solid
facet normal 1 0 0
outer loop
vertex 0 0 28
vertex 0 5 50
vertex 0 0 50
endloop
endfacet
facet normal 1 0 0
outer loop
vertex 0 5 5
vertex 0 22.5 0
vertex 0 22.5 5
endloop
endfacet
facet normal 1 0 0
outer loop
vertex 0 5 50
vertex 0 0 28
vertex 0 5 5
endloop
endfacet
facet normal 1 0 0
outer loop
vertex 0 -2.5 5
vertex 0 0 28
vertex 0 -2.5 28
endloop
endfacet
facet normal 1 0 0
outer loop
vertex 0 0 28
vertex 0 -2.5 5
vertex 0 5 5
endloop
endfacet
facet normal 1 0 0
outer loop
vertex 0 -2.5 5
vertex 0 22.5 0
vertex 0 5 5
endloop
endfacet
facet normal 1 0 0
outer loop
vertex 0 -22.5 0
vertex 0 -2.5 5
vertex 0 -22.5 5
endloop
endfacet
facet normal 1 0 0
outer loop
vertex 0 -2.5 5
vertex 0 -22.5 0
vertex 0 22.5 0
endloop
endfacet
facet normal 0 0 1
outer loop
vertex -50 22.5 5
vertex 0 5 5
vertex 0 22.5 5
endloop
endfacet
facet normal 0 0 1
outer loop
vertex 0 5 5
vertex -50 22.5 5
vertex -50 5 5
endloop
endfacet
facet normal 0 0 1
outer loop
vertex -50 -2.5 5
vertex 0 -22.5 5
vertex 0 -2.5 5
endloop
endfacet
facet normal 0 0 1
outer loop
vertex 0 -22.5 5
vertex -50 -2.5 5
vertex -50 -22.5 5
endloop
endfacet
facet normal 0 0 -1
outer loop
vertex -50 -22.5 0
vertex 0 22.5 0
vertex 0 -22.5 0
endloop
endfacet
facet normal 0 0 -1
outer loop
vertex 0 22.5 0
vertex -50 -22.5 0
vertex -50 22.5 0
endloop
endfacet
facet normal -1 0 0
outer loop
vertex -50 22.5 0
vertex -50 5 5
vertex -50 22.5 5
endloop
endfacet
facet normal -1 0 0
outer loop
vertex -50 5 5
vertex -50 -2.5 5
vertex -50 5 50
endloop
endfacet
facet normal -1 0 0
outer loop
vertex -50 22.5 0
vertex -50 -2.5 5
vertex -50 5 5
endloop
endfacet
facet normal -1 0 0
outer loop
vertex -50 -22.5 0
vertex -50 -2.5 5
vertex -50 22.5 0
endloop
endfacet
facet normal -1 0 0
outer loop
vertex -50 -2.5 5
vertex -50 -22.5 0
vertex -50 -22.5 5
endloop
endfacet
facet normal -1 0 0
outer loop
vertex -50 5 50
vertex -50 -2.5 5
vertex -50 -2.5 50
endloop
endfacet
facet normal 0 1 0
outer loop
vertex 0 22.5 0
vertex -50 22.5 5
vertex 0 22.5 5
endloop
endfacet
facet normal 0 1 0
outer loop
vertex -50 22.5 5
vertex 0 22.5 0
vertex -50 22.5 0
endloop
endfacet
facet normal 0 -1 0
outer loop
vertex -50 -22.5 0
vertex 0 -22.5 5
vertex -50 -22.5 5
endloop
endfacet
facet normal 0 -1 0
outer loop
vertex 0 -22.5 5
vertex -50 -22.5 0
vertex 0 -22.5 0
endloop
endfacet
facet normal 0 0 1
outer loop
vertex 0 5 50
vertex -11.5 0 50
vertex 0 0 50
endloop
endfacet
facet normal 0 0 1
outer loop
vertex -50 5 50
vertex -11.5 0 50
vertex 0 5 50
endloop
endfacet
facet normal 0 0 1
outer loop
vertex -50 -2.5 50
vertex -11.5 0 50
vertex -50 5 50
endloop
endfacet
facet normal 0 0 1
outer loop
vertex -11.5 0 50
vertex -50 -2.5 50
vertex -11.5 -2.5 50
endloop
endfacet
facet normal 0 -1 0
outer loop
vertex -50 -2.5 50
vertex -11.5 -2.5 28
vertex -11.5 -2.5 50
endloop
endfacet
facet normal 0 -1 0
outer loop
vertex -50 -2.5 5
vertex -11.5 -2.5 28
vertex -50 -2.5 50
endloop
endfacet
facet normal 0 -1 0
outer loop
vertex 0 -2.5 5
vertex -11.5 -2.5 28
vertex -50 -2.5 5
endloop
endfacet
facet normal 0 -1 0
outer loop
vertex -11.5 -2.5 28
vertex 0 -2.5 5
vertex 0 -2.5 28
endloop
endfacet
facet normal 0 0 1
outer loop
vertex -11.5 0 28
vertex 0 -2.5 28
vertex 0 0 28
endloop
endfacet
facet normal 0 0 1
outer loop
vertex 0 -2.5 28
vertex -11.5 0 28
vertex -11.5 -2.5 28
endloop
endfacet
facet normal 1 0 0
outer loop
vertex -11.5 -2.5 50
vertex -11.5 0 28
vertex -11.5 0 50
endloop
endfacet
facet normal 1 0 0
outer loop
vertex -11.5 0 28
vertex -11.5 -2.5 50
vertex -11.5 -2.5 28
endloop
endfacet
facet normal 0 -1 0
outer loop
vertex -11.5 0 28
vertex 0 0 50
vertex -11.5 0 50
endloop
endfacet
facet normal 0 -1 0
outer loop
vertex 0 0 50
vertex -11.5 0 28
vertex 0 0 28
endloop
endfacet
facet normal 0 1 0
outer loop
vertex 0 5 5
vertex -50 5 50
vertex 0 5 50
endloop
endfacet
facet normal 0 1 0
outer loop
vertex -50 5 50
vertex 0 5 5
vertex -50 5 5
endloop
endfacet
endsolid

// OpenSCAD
// Built by bench/smallmodels/features/compiler.py from a list of features.
$fn = 64;
difference() {
  union() {
    translate([-25, 0, 0]) translate([-25, -22.5, 0]) cube([50, 45, 5]);
    translate([-25, 0, 0]) translate([-25, -2.5, 0]) cube([50, 5, 50]);
  }
  union() {
    translate([-17, 30, 3.75]) rotate([0, 0, 0]) rotate([0, 90, 0]) cylinder(d = 4.5, h = 1200, center = true);
    translate([17, 30, 3.75]) rotate([0, 0, 0]) rotate([0, 90, 0]) cylinder(d = 4.5, h = 1200, center = true);
    translate([0, 0, 28]) rotate([0, 0, 0]) translate([-11.5, -15.5, 0]) cube([23, 31, 50]);
  }
}
union() {
    translate([-25, 0, 0]) linear_extrude(height = 50) polygon([[-25, 0], [25, 0], [25, 5], [-25, 5]]);
  }
